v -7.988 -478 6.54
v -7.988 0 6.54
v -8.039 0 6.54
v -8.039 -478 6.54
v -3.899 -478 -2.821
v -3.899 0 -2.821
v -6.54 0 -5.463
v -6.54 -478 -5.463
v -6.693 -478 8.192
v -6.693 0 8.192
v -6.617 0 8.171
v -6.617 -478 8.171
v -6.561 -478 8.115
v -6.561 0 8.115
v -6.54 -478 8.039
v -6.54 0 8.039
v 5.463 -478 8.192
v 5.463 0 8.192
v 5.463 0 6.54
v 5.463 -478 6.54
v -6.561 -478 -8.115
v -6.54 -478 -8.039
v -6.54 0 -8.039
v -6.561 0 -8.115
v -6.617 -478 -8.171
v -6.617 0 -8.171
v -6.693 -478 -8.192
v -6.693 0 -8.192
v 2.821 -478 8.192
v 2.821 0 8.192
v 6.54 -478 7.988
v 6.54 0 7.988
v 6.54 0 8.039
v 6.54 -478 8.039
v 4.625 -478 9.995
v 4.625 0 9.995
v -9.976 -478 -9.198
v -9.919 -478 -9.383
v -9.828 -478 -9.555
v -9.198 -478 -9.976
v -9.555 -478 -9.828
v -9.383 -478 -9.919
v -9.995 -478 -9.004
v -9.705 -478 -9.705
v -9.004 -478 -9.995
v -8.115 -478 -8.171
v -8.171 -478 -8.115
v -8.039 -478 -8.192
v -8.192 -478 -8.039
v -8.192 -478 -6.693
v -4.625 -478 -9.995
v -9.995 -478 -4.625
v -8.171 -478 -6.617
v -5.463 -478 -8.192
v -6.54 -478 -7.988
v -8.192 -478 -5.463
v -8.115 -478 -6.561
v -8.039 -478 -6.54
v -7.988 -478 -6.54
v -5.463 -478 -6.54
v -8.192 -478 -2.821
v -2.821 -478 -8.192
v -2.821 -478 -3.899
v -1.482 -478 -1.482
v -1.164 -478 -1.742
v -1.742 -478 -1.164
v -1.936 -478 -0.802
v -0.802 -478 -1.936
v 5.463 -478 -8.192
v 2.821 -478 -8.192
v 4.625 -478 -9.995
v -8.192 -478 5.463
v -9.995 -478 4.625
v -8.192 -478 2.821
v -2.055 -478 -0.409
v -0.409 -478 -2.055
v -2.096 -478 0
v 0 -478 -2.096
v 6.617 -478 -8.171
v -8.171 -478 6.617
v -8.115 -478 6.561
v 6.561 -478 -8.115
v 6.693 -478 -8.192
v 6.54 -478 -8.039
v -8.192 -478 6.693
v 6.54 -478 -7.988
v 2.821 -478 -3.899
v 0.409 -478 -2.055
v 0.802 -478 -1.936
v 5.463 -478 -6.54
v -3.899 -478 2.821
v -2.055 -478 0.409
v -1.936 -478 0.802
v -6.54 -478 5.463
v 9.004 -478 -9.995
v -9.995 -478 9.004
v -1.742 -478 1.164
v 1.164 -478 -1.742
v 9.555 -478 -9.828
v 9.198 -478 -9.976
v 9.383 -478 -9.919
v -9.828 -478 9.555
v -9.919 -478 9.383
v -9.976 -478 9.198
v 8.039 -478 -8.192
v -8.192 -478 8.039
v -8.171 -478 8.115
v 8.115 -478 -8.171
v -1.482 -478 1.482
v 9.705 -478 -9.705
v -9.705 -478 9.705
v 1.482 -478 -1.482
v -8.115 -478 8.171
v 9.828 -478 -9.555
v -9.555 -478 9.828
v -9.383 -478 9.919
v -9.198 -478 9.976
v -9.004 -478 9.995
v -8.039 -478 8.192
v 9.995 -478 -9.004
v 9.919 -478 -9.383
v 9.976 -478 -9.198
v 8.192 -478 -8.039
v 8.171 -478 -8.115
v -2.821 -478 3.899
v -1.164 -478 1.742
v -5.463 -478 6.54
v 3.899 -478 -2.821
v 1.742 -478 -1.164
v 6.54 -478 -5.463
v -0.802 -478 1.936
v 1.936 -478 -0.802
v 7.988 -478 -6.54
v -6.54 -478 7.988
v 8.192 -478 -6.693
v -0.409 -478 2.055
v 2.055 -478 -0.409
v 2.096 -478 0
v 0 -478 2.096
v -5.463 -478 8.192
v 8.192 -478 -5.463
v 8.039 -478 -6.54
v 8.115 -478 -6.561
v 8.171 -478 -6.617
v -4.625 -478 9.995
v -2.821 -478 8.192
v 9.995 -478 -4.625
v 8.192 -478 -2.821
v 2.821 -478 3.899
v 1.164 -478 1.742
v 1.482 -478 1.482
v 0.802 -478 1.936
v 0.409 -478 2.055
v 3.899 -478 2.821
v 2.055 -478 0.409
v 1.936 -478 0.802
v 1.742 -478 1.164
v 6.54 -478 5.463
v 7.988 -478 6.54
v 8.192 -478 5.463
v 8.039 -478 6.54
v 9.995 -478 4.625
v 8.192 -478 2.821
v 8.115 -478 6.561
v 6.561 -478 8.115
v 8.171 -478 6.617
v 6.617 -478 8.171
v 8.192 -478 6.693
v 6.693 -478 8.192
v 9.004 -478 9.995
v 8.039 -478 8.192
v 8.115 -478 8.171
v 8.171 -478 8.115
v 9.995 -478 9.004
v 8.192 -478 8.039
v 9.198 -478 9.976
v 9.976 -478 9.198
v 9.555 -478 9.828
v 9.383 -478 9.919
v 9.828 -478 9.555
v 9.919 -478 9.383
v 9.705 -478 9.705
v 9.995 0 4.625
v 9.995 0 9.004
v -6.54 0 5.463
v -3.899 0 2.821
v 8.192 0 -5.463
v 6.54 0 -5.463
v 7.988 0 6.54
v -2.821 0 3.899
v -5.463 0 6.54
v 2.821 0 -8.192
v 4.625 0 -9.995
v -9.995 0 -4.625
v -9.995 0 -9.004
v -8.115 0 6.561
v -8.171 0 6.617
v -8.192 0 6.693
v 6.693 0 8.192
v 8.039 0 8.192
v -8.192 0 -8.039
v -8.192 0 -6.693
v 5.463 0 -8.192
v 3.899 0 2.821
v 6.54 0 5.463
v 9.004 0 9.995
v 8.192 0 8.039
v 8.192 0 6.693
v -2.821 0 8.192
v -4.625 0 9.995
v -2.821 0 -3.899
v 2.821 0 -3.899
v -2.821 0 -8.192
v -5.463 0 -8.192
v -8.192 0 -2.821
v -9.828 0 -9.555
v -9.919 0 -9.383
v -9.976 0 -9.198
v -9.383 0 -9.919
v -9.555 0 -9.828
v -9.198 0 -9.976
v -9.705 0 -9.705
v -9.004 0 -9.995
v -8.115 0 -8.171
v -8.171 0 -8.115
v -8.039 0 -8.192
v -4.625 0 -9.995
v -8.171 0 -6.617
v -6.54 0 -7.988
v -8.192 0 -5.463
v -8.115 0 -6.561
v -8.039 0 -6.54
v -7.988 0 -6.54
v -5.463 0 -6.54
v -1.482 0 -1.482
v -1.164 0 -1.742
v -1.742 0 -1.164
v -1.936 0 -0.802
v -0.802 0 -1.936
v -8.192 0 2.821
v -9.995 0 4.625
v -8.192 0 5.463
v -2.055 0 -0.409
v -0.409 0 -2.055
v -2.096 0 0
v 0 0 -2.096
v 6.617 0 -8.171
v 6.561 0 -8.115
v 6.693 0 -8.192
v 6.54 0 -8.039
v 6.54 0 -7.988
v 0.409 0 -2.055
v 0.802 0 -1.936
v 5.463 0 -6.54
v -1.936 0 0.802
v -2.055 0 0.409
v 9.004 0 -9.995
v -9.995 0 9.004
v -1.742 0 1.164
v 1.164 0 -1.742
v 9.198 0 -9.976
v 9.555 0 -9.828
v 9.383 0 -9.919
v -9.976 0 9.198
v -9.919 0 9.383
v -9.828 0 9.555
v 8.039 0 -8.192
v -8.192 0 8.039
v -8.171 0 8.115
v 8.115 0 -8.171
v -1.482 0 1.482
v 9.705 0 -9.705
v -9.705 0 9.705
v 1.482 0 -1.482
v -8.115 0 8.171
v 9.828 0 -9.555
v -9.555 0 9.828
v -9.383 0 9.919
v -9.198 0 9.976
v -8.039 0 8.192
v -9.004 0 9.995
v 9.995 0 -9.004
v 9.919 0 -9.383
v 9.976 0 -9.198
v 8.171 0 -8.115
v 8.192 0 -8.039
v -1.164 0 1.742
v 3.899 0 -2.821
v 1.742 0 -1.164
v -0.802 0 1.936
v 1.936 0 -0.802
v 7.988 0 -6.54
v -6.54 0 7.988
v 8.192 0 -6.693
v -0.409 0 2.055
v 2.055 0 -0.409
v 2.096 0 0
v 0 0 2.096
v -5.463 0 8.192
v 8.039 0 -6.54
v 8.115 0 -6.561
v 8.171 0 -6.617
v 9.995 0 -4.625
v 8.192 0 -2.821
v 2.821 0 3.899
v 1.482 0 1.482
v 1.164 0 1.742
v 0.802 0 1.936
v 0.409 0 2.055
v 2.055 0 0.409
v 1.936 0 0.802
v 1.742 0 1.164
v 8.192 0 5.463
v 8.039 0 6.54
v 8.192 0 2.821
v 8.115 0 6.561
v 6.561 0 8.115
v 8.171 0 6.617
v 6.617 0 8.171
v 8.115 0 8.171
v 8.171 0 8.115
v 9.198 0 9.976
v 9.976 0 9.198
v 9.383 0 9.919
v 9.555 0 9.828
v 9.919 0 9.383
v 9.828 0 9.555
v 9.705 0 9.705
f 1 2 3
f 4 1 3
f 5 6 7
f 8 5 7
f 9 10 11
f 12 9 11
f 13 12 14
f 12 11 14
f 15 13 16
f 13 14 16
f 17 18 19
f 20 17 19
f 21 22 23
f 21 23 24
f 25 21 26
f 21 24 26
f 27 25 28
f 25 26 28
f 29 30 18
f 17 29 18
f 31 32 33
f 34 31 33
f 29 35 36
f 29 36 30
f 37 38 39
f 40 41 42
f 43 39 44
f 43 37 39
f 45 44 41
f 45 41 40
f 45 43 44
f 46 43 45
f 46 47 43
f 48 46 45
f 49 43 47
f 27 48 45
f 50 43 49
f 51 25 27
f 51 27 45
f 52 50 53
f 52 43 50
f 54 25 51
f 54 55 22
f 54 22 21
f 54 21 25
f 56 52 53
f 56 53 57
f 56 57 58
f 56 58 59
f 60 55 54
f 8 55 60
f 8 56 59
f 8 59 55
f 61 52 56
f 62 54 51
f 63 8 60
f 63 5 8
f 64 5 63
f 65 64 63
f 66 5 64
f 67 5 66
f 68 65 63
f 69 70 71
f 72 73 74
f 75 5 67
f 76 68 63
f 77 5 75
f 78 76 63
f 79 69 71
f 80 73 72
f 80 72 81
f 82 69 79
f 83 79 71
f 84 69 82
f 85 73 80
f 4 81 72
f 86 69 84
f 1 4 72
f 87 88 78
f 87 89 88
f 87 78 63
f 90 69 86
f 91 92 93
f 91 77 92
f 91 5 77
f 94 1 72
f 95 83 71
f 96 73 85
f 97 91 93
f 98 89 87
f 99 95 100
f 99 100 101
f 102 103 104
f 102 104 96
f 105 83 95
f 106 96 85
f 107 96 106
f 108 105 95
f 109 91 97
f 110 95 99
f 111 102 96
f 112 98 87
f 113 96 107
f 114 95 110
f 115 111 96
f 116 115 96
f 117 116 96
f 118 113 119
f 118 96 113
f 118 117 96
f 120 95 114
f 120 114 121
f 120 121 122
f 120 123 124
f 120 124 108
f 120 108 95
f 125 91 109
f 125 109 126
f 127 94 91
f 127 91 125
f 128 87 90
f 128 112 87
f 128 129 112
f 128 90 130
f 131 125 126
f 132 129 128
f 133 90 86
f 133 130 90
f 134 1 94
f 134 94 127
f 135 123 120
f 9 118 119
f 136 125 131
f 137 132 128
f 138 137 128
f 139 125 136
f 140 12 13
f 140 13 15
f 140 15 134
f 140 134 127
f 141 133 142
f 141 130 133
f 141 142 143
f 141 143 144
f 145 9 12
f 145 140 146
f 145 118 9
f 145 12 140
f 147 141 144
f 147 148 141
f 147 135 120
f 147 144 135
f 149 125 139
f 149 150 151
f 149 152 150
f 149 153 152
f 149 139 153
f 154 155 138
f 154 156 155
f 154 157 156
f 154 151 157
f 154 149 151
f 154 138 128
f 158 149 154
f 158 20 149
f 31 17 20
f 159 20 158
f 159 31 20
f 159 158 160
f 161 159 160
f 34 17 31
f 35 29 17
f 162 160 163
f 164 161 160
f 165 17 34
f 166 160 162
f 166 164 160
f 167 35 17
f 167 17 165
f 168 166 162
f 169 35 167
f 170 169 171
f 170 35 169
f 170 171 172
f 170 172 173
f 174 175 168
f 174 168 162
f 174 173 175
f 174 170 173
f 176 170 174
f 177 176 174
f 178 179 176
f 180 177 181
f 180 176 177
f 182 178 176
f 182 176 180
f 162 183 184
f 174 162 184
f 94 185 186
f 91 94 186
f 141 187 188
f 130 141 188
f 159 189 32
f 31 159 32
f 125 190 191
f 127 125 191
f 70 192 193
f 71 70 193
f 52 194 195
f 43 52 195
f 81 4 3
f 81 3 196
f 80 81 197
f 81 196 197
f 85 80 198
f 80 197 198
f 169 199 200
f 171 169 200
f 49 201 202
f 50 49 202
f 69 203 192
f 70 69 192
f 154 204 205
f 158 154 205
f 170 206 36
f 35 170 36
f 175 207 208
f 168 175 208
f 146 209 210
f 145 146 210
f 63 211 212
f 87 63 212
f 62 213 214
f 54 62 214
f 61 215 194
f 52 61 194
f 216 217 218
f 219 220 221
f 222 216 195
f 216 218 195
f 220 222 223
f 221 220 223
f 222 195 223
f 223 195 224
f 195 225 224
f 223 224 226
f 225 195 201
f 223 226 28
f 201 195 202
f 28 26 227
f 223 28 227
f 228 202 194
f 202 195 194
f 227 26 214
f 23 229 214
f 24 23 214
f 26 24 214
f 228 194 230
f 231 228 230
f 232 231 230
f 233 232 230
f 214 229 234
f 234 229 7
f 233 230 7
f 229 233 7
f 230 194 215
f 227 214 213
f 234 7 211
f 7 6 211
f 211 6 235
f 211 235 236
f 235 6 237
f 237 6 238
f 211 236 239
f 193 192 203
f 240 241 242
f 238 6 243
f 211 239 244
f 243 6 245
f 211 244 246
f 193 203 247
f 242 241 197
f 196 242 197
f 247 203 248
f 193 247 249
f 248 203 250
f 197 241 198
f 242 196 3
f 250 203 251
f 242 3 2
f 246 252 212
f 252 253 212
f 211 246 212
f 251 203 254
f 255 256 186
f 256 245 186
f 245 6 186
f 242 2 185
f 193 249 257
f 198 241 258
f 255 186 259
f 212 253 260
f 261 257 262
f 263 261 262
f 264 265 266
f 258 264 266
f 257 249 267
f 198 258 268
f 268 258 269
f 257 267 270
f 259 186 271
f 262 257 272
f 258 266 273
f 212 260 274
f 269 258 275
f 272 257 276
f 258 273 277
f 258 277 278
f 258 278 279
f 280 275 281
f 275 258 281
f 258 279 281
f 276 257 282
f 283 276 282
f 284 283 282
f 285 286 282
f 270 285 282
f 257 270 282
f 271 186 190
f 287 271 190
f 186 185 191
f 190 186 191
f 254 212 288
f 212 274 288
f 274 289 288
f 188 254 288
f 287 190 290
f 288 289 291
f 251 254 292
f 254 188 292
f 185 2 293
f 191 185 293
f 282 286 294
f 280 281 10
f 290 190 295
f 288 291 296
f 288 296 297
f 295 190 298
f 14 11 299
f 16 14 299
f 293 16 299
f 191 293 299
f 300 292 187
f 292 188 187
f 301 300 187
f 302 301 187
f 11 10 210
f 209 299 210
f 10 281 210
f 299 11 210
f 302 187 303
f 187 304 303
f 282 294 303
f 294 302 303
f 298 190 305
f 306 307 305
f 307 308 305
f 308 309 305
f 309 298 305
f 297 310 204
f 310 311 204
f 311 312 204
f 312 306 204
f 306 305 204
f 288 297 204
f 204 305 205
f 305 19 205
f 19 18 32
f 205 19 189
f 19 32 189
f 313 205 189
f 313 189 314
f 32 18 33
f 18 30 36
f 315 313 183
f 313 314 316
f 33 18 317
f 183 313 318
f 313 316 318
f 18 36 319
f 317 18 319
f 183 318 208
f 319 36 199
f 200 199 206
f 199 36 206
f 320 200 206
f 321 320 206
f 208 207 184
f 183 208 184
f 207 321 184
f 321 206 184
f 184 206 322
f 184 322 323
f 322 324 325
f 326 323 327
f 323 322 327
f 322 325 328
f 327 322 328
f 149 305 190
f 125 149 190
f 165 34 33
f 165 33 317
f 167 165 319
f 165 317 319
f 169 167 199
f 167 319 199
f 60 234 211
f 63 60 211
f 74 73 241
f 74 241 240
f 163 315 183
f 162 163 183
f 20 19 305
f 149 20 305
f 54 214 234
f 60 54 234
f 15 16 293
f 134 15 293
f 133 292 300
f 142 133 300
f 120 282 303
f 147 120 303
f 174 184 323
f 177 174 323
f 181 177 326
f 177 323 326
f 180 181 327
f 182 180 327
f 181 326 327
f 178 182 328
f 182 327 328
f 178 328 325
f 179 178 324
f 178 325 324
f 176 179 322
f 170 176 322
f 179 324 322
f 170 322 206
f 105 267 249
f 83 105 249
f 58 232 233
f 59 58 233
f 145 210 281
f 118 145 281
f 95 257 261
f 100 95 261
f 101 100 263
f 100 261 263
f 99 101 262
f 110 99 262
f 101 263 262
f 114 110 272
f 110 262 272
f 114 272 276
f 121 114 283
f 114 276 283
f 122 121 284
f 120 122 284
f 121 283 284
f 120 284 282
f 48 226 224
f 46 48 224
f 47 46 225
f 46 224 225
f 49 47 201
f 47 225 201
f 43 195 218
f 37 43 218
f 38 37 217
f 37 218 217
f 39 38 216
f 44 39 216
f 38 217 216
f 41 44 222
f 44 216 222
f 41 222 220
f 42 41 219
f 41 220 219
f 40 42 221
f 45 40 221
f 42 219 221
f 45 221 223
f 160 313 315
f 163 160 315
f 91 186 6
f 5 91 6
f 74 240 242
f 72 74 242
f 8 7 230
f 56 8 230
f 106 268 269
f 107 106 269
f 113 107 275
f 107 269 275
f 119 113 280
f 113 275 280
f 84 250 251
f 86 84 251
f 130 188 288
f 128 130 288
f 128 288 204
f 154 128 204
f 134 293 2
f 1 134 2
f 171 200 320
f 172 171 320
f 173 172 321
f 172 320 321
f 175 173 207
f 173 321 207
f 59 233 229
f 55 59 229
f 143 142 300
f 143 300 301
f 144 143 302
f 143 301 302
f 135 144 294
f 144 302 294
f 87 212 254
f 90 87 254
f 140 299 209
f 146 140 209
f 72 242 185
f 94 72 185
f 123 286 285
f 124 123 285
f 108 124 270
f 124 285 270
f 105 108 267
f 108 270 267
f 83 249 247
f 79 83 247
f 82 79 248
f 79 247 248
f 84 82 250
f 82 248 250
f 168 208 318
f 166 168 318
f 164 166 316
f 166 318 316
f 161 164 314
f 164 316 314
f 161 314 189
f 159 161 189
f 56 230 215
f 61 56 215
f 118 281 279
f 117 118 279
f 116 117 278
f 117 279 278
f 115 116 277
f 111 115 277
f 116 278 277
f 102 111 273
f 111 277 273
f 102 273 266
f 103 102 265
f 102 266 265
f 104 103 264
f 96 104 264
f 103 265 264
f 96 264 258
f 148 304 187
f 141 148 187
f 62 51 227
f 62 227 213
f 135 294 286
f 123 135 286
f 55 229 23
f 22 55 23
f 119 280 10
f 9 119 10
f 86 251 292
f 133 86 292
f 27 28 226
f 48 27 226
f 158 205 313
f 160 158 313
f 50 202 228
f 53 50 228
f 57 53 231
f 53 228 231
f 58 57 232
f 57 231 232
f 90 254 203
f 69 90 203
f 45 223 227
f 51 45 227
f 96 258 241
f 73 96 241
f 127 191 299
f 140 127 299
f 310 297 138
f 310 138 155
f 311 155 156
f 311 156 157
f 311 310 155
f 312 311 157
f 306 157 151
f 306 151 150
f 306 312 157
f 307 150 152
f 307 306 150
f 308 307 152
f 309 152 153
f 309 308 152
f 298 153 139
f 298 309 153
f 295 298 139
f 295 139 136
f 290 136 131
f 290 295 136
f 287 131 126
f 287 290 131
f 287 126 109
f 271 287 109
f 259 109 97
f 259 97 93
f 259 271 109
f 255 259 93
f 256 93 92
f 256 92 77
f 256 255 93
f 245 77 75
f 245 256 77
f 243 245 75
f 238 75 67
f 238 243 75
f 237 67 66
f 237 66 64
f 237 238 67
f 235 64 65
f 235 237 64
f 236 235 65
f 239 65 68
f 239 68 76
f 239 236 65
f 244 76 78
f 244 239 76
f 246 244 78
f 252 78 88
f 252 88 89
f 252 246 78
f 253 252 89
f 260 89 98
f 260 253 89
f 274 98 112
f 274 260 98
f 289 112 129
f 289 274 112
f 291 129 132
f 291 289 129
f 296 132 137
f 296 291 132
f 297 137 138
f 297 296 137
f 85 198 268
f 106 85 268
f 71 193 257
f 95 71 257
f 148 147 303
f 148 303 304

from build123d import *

# Parameters (mm, degrees)
F0_R     = 2.0955
F2_DEPTH = 478


with BuildPart() as f2:
    # F0 (on Front) → F2 (new body)
    with BuildSketch(Plane.XZ):
        with BuildLine():
            Line((-4.6246692655, 9.9949), (-9.0043, 9.9949))
            ThreePointArc((-9.0043, 9.9949), (-9.7047599774, 9.7047599774), (-9.9949, 9.0043))
            Line((-9.9949, 9.0043), (-9.9949, 4.6246692655))
            Line((-9.9949, 4.6246692655), (-8.1915, 2.8212692655))
            Line((-8.1915, 2.8212692655), (-8.1915, 5.4628692655))
            Line((-8.1915, 5.4628692655), (-6.5405, 5.4628692655))
            Line((-6.5405, 5.4628692655), (-3.8989, 2.8212692655))
            Line((-3.8989, 2.8212692655), (-3.8989, -2.8212692655))
            Line((-3.8989, -2.8212692655), (-6.5405, -5.4628692655))
            Line((-6.5405, -5.4628692655), (-8.1915, -5.4628692655))
            Line((-8.1915, -5.4628692655), (-8.1915, -2.8212692655))
            Line((-8.1915, -2.8212692655), (-9.9949, -4.6246692655))
            Line((-9.9949, -4.6246692655), (-9.9949, -9.0043))
            ThreePointArc((-9.9949, -9.0043), (-9.7047599774, -9.7047599774), (-9.0043, -9.9949))
            Line((-9.0043, -9.9949), (-4.6246692655, -9.9949))
            Line((-4.6246692655, -9.9949), (-2.8212692655, -8.1915))
            Line((-2.8212692655, -8.1915), (-5.4628692655, -8.1915))
            Line((-5.4628692655, -8.1915), (-5.4628692655, -6.5405))
            Line((-5.4628692655, -6.5405), (-2.8212692655, -3.8989))
            Line((-2.8212692655, -3.8989), (2.8212692655, -3.8989))
            Line((2.8212692655, -3.8989), (5.4628692655, -6.5405))
            Line((5.4628692655, -6.5405), (5.4628692655, -8.1915))
            Line((5.4628692655, -8.1915), (2.8212692655, -8.1915))
            Line((2.8212692655, -8.1915), (4.6246692655, -9.9949))
            Line((4.6246692655, -9.9949), (9.0043, -9.9949))
            ThreePointArc((9.0043, -9.9949), (9.7047599774, -9.7047599774), (9.9949, -9.0043))
            Line((9.9949, -9.0043), (9.9949, -4.6246692655))
            Line((9.9949, -4.6246692655), (8.1915, -2.8212692655))
            Line((8.1915, -2.8212692655), (8.1915, -5.4628692655))
            Line((8.1915, -5.4628692655), (6.5405, -5.4628692655))
            Line((6.5405, -5.4628692655), (3.8989, -2.8212692655))
            Line((3.8989, -2.8212692655), (3.8989, 2.8212692655))
            Line((3.8989, 2.8212692655), (6.5405, 5.4628692655))
            Line((6.5405, 5.4628692655), (8.1915, 5.4628692655))
            Line((8.1915, 5.4628692655), (8.1915, 2.8212692655))
            Line((8.1915, 2.8212692655), (9.9949, 4.6246692655))
            Line((9.9949, 4.6246692655), (9.9949, 9.0043))
            ThreePointArc((9.9949, 9.0043), (9.7047599774, 9.7047599774), (9.0043, 9.9949))
            Line((9.0043, 9.9949), (4.6246692655, 9.9949))
            Line((4.6246692655, 9.9949), (2.8212692655, 8.1915))
            Line((2.8212692655, 8.1915), (5.4628692655, 8.1915))
            Line((5.4628692655, 8.1915), (5.4628692655, 6.5405))
            Line((5.4628692655, 6.5405), (2.8212692655, 3.8989))
            Line((2.8212692655, 3.8989), (-2.8212692655, 3.8989))
            Line((-2.8212692655, 3.8989), (-5.4628692655, 6.5405))
            Line((-5.4628692655, 6.5405), (-5.4628692655, 8.1915))
            Line((-5.4628692655, 8.1915), (-2.8212692655, 8.1915))
            Line((-2.8212692655, 8.1915), (-4.6246692655, 9.9949))
        make_face()
        with BuildLine():
            ThreePointArc((-8.0391, -8.1915), (-8.1468630735, -8.1468630735), (-8.1915, -8.0391))
            Line((-8.1915, -8.0391), (-8.1915, -6.6929))
            ThreePointArc((-8.1915, -6.6929), (-8.1468630735, -6.5851369265), (-8.0391, -6.5405))
            Line((-8.0391, -6.5405), (-7.9883, -6.5405))
            Line((-7.9883, -6.5405), (-6.5405, -7.9883))
            Line((-6.5405, -7.9883), (-6.5405, -8.0391))
            ThreePointArc((-6.5405, -8.0391), (-6.5851369265, -8.1468630735), (-6.6929, -8.1915))
            Line((-6.6929, -8.1915), (-8.0391, -8.1915))
        make_face(mode=Mode.SUBTRACT)
        with BuildLine():
            Line((8.1915, -6.6929), (8.1915, -8.0391))
            ThreePointArc((8.1915, -8.0391), (8.1468630735, -8.1468630735), (8.0391, -8.1915))
            Line((8.0391, -8.1915), (6.6929, -8.1915))
            ThreePointArc((6.6929, -8.1915), (6.5851369265, -8.1468630735), (6.5405, -8.0391))
            Line((6.5405, -8.0391), (6.5405, -7.9883))
            Line((6.5405, -7.9883), (7.9883, -6.5405))
            Line((7.9883, -6.5405), (8.0391, -6.5405))
            ThreePointArc((8.0391, -6.5405), (8.1468630735, -6.5851369265), (8.1915, -6.6929))
        make_face(mode=Mode.SUBTRACT)
        with BuildLine():
            Line((-7.9883, 6.5405), (-8.0391, 6.5405))
            ThreePointArc((-8.0391, 6.5405), (-8.1468630735, 6.5851369265), (-8.1915, 6.6929))
            Line((-8.1915, 6.6929), (-8.1915, 8.0391))
            ThreePointArc((-8.1915, 8.0391), (-8.1468630735, 8.1468630735), (-8.0391, 8.1915))
            Line((-8.0391, 8.1915), (-6.6929, 8.1915))
            ThreePointArc((-6.6929, 8.1915), (-6.5851369265, 8.1468630735), (-6.5405, 8.0391))
            Line((-6.5405, 8.0391), (-6.5405, 7.9883))
            Line((-6.5405, 7.9883), (-7.9883, 6.5405))
        make_face(mode=Mode.SUBTRACT)
        Circle(F0_R, mode=Mode.SUBTRACT)
        with BuildLine():
            ThreePointArc((8.1915, 6.6929), (8.1468630735, 6.5851369265), (8.0391, 6.5405))
            Line((8.0391, 6.5405), (7.9883, 6.5405))
            Line((7.9883, 6.5405), (6.5405, 7.9883))
            Line((6.5405, 7.9883), (6.5405, 8.0391))
            ThreePointArc((6.5405, 8.0391), (6.5851369265, 8.1468630735), (6.6929, 8.1915))
            Line((6.6929, 8.1915), (8.0391, 8.1915))
            ThreePointArc((8.0391, 8.1915), (8.1468630735, 8.1468630735), (8.1915, 8.0391))
            Line((8.1915, 8.0391), (8.1915, 6.6929))
        make_face(mode=Mode.SUBTRACT)
    extrude(amount=F2_DEPTH)


solid = f2.part
